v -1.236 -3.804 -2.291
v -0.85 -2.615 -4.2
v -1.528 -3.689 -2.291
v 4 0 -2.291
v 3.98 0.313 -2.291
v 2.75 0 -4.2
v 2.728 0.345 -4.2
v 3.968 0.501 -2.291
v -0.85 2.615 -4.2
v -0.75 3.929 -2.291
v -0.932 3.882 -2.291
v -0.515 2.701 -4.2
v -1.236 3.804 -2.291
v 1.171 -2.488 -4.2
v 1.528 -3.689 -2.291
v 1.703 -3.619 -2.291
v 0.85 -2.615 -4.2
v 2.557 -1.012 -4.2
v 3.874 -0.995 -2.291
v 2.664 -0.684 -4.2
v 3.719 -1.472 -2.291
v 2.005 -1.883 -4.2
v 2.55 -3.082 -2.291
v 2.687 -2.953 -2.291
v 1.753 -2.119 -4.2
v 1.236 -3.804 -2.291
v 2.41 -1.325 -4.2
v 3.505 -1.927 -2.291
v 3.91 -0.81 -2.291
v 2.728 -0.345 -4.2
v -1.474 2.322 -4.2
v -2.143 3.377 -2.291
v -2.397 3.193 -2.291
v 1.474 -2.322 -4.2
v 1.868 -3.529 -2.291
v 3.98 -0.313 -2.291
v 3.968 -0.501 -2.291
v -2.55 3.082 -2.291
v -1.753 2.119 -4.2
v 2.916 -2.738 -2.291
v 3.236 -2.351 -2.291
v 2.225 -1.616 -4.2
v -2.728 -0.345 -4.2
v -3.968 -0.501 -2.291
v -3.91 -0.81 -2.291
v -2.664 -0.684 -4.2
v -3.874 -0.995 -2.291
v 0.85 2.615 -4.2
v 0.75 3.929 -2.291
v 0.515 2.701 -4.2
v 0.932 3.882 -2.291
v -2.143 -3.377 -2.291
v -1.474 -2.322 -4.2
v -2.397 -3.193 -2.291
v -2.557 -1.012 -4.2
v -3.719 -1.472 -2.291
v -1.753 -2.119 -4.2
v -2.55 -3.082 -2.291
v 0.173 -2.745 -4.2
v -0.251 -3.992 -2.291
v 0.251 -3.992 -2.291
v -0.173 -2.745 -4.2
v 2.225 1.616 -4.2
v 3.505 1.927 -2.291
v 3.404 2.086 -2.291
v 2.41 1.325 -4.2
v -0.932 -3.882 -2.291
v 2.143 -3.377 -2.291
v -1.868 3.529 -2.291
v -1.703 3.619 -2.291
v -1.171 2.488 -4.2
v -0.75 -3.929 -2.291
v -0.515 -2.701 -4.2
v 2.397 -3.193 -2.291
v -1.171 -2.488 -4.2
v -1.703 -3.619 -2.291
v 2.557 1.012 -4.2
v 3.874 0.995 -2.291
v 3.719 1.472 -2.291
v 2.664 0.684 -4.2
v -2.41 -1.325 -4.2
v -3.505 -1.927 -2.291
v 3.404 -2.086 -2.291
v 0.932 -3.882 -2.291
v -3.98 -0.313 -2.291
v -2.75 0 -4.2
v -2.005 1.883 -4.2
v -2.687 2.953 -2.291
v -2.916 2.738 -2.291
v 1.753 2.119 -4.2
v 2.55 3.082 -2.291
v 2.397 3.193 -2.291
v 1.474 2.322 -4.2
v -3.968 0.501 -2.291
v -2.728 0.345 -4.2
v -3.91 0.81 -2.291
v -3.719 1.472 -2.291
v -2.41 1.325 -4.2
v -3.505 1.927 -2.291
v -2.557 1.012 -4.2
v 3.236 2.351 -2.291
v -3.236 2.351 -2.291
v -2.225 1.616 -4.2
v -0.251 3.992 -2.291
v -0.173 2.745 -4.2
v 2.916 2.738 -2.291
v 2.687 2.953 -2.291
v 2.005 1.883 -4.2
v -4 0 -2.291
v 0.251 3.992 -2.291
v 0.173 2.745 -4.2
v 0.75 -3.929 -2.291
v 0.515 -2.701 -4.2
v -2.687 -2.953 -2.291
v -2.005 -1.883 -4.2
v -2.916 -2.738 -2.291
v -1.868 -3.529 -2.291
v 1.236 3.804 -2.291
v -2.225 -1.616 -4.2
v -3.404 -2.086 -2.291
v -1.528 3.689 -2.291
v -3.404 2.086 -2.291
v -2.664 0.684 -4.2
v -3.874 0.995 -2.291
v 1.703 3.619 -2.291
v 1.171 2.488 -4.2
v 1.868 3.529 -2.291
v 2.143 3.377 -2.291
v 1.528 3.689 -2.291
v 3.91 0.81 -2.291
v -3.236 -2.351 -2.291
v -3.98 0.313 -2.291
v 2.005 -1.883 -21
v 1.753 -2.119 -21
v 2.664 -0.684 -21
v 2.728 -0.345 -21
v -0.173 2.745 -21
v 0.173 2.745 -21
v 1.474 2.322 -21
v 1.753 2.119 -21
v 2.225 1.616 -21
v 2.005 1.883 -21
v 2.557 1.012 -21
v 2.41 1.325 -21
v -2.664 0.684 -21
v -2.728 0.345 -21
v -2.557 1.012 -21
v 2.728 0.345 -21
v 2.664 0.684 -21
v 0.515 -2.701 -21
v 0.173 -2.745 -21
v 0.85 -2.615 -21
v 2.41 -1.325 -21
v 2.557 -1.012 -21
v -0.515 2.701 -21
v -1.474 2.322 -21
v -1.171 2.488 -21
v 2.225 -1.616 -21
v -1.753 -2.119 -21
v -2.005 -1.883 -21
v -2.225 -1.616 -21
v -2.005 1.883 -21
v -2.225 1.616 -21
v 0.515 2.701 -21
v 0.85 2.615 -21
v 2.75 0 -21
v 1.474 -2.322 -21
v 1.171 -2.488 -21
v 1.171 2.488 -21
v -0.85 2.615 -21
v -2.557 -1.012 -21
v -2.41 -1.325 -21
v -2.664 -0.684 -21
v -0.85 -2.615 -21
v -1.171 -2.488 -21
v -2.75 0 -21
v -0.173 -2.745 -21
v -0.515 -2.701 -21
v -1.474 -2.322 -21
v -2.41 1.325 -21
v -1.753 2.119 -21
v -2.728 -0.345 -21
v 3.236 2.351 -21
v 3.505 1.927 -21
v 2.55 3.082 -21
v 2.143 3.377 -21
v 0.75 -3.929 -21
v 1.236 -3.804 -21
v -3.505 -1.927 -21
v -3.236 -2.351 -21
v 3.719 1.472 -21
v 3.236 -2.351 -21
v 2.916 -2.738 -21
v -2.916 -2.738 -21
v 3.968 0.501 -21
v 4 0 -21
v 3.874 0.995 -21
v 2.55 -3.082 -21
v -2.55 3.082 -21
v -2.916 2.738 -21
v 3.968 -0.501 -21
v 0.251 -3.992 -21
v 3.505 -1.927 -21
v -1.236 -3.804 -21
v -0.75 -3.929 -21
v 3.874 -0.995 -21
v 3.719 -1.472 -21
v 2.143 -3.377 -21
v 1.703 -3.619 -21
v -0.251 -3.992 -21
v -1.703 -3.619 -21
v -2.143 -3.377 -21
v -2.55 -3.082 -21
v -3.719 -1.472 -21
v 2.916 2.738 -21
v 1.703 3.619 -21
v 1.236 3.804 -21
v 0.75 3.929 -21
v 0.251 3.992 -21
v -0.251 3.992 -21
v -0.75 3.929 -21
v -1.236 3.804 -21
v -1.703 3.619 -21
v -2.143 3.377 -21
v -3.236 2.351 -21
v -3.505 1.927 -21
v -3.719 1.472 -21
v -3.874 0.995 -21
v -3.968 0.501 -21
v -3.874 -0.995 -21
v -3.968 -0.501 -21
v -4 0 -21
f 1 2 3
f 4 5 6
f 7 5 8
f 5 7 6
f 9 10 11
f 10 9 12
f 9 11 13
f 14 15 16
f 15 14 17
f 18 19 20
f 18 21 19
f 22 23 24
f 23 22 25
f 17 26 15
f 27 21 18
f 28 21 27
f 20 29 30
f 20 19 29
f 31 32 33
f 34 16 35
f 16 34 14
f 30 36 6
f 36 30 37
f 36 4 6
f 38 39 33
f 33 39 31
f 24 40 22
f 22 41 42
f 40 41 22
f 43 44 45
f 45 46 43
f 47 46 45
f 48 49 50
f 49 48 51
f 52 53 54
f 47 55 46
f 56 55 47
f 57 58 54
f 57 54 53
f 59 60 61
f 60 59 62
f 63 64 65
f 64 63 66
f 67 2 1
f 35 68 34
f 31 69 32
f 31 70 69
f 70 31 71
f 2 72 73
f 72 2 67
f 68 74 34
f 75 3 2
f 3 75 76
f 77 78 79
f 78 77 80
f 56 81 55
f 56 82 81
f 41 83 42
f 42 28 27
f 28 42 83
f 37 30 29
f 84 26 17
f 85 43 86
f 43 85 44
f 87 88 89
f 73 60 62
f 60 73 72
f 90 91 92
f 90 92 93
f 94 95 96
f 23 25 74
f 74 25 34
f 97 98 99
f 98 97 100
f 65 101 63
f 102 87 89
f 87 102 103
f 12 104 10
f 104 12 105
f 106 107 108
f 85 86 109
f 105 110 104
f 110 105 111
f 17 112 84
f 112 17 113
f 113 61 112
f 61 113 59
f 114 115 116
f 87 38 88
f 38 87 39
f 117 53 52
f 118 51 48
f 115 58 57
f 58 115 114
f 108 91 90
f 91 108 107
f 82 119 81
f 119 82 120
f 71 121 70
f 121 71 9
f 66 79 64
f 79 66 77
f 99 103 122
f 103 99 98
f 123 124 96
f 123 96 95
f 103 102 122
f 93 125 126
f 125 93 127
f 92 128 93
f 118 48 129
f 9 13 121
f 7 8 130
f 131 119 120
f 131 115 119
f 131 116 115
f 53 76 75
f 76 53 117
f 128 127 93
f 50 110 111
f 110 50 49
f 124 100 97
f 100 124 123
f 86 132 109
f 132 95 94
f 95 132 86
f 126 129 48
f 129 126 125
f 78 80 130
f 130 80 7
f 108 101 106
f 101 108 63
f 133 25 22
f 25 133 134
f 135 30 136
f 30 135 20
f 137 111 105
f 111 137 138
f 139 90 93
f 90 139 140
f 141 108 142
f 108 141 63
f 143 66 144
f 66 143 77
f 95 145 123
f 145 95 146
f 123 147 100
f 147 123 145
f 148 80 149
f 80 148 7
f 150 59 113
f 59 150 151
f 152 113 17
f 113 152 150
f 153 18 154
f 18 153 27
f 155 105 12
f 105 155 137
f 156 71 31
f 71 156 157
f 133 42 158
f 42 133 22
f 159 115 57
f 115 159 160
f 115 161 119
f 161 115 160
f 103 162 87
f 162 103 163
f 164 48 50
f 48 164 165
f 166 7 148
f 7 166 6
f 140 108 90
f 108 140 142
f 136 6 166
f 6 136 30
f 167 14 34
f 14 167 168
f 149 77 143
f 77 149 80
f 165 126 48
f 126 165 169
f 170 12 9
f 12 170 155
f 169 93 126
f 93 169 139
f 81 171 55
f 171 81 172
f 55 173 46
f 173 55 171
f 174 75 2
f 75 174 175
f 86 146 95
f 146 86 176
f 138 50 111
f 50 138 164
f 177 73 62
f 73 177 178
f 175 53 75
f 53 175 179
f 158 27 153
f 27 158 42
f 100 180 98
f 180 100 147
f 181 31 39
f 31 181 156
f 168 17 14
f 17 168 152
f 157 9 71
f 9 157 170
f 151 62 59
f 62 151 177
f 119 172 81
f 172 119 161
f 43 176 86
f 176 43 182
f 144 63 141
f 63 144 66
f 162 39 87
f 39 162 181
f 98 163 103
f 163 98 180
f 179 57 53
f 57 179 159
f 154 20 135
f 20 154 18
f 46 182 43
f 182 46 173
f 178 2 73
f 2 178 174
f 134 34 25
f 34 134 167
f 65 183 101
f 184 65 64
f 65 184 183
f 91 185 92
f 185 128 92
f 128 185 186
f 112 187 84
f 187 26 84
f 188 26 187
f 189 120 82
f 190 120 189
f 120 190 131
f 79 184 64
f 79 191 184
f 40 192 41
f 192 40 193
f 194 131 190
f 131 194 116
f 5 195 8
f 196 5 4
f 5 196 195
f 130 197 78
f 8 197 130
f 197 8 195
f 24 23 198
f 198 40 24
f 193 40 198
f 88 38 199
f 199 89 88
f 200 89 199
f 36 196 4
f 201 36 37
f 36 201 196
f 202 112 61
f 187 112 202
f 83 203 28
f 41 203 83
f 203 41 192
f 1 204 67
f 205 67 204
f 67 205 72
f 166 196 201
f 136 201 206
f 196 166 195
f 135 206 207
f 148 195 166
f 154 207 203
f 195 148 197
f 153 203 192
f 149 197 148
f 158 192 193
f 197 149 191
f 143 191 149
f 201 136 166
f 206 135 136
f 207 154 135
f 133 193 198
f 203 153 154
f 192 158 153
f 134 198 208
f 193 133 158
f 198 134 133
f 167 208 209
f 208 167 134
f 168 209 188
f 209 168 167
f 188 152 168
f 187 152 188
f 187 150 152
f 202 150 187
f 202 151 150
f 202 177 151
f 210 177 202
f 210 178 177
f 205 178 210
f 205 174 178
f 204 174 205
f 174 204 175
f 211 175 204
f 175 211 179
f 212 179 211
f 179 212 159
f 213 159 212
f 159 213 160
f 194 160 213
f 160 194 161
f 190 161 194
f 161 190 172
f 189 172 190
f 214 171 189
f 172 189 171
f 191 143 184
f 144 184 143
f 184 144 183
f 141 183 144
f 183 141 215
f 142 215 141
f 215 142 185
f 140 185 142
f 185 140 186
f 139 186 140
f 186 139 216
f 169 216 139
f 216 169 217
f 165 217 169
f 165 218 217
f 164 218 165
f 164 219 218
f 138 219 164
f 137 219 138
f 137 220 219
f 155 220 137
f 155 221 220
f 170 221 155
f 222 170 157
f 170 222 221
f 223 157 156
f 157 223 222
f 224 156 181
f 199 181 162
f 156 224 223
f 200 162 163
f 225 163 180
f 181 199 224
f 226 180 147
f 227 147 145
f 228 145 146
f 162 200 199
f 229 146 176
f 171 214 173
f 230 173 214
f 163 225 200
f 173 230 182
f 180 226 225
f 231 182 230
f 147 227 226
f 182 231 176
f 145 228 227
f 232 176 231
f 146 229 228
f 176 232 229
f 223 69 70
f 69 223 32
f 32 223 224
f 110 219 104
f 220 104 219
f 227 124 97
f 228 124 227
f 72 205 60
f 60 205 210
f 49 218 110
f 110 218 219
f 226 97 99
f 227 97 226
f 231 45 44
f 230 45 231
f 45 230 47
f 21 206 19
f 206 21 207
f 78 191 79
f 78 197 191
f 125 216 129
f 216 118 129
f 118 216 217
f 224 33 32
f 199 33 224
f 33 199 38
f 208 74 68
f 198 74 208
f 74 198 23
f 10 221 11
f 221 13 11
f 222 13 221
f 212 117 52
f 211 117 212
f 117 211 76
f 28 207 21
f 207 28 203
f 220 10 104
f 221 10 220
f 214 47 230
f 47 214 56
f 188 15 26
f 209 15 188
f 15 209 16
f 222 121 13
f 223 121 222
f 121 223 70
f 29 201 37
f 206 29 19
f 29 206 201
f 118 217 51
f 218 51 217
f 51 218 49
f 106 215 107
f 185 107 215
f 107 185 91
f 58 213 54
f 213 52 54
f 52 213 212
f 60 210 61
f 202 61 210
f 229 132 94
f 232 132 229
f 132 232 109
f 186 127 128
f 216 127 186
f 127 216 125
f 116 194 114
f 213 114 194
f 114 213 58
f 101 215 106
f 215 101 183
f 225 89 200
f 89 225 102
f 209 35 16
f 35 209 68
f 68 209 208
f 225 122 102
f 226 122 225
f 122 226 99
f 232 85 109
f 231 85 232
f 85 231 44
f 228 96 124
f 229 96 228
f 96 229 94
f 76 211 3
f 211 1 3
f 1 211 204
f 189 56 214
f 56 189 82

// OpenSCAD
$fn = 50;

difference() {
	union() {
		translate(v = [0, 0, -21.0]) {
			cylinder(h = 24, r = 4.0);
		}
	}
	union() {
		translate(v = [0, 0, 0]) {
			rotate(a = [0, 0, 0]) {
				difference() {
					union() {
						translate(v = [0, 0, -24.0]) {
							cylinder(h = 24, r = 2.25);
						}
						translate(v = [0, 0, -4.2]) {
							cylinder(h = 4.2, r1 = 2.75, r2 = 5.5);
						}
						translate(v = [0, 0, -24.0]) {
							cylinder(h = 24, r = 2.75);
						}
						translate(v = [0, 0, -24.0]) {
							cylinder(h = 24, r = 2.25);
						}
					}
					union();
				}
			}
		}
		#cylinder(h = 3, r = 6.25);
	}
}
